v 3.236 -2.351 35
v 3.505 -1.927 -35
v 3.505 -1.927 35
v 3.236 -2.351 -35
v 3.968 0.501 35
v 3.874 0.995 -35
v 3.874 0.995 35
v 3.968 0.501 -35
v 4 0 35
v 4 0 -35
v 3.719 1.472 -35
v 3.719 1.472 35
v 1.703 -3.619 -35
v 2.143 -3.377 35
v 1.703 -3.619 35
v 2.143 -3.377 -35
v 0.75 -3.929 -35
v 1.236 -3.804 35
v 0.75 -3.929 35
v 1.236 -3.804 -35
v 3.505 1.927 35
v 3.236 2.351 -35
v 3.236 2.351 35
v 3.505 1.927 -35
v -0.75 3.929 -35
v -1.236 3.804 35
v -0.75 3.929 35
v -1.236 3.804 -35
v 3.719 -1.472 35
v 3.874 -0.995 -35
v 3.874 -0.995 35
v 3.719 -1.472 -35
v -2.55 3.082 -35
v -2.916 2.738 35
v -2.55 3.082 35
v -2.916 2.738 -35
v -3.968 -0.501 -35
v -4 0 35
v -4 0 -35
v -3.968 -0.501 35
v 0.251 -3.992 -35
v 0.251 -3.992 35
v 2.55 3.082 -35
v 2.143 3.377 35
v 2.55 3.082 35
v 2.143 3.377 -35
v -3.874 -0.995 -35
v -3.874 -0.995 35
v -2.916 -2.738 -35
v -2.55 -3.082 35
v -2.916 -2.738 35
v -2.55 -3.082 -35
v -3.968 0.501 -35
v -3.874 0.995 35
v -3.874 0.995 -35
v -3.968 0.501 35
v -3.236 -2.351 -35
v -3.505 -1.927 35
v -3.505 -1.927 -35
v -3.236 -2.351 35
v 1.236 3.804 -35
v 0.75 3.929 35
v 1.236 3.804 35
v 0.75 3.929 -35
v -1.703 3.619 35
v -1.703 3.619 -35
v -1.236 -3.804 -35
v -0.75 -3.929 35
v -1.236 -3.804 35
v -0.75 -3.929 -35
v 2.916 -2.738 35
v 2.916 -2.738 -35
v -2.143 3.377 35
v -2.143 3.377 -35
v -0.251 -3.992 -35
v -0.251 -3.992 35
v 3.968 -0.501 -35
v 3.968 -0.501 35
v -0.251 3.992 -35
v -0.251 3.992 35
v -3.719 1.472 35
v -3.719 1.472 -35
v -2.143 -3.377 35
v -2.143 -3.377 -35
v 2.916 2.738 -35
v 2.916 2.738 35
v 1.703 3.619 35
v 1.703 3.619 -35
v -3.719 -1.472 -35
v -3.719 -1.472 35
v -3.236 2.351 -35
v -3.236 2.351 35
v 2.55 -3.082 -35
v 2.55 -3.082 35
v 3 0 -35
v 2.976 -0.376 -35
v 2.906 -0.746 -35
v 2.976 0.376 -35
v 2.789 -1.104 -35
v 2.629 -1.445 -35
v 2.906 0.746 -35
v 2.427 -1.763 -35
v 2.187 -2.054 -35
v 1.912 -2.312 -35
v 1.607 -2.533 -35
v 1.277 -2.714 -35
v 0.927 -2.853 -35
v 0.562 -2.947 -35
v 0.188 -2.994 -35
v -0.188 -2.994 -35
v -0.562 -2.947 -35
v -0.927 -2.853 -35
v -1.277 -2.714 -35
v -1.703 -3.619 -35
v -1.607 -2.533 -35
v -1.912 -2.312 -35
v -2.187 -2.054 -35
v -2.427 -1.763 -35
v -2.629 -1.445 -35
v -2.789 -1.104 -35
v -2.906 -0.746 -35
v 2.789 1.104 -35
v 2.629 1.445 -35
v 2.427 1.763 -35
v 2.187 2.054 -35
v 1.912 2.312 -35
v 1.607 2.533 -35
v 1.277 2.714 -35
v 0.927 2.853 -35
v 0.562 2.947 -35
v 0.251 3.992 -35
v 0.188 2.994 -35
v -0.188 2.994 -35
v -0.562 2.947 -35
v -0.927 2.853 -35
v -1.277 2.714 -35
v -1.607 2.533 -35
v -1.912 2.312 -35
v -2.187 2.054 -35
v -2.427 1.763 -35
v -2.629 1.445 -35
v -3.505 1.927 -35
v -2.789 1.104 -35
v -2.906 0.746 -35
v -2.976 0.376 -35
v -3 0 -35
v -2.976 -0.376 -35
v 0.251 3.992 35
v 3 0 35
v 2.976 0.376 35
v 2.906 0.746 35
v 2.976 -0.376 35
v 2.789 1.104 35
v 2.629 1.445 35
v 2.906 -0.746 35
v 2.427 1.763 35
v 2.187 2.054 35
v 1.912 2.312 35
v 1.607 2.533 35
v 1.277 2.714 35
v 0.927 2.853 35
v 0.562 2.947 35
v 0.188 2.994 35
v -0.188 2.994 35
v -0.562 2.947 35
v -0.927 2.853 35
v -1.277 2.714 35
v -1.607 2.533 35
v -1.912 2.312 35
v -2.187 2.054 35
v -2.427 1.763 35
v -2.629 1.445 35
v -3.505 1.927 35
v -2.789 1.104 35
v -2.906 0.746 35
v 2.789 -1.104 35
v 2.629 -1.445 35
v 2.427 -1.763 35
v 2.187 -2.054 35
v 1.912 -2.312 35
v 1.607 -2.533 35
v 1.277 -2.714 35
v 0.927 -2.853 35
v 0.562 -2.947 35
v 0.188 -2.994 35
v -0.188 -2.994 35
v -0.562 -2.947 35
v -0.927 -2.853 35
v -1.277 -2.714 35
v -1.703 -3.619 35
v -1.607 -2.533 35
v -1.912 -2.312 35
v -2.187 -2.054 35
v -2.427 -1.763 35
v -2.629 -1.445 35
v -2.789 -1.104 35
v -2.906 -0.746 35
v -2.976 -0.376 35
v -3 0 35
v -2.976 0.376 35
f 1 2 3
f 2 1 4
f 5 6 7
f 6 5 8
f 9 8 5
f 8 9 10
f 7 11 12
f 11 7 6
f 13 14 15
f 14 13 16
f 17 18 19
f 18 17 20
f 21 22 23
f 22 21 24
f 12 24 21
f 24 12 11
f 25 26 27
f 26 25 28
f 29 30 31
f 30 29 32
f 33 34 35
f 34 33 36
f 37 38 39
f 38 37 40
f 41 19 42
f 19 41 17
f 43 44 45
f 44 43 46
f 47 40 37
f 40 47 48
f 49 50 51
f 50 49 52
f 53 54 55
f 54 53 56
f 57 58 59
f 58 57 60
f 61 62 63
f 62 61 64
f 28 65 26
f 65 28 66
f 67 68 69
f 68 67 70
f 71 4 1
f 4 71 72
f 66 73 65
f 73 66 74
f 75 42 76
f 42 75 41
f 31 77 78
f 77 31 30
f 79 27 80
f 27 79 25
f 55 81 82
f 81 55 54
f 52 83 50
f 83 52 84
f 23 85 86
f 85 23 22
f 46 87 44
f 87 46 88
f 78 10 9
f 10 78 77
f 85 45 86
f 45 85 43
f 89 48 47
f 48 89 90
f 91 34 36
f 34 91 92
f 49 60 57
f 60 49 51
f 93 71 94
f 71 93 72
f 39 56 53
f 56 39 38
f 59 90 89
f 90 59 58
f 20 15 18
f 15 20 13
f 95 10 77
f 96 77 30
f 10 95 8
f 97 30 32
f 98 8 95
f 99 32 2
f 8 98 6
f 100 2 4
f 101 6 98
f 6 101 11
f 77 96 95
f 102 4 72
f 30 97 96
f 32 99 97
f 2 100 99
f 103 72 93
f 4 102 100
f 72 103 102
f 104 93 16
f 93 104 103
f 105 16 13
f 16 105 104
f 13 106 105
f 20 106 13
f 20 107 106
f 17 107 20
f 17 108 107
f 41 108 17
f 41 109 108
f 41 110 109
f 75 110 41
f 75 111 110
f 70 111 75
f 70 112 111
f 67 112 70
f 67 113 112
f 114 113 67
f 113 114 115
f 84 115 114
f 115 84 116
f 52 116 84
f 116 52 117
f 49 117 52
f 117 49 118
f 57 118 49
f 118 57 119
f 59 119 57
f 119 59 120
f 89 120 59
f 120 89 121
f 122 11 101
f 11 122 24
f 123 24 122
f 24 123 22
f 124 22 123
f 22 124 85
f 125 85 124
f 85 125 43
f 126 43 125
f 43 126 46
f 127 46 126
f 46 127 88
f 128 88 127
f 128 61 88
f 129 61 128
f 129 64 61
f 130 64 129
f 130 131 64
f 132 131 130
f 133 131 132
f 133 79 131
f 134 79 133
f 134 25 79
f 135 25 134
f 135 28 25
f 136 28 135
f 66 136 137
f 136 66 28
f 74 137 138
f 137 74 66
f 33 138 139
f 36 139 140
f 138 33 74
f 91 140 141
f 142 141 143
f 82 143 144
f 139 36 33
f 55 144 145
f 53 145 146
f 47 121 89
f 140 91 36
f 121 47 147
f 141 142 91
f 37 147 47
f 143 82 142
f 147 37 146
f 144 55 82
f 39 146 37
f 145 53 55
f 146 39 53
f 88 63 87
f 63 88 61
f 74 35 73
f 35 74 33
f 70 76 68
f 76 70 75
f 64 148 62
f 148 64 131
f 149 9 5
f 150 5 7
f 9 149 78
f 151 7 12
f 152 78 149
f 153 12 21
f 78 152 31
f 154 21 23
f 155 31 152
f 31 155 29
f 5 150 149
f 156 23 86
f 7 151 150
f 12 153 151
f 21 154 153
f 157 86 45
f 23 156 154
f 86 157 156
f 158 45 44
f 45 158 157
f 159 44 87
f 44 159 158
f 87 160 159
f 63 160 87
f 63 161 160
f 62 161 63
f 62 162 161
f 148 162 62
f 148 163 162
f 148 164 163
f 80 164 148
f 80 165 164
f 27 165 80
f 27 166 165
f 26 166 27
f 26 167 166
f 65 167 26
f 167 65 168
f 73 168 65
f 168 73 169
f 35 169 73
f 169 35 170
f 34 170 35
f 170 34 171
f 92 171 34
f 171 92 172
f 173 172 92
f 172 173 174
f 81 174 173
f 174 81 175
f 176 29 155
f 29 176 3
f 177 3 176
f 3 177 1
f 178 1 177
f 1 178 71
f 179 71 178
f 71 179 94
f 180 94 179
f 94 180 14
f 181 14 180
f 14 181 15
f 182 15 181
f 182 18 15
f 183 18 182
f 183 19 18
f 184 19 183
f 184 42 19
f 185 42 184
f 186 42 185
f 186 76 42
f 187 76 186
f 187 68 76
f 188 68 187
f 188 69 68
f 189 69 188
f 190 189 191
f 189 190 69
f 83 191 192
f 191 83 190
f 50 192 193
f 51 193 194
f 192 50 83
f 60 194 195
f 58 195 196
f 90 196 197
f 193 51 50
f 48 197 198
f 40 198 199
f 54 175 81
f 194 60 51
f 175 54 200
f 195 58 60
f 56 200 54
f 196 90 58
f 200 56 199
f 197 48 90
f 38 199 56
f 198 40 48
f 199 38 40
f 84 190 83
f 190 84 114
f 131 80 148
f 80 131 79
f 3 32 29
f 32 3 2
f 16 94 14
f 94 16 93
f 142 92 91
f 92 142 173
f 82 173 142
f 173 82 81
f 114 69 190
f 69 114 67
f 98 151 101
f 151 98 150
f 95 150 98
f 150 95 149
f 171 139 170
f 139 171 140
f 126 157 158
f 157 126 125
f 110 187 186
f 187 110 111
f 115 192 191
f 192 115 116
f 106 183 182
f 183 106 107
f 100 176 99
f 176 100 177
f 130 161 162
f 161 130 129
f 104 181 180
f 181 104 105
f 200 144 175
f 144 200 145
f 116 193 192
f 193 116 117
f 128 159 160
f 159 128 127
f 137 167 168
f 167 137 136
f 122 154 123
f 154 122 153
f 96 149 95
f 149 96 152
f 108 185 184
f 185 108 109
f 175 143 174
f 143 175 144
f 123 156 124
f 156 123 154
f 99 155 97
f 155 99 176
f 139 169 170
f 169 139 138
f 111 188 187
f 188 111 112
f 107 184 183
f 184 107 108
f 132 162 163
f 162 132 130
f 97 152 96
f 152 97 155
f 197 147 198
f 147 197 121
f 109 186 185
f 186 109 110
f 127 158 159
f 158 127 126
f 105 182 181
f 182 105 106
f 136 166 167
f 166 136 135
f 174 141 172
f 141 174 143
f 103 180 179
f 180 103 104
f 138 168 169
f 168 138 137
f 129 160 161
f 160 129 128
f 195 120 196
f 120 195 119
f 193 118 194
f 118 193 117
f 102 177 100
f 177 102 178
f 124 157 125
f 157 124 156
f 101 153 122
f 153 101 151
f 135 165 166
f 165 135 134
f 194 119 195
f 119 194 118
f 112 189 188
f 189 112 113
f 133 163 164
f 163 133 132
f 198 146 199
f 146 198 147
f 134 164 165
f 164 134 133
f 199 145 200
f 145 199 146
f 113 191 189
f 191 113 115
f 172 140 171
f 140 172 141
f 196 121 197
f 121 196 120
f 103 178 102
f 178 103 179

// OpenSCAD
$fn = 50;


difference() {
	union() {
		translate(v = [0, 0, -35.0000000000]) {
			cylinder(h = 70, r = 4.0000000000);
		}
	}
	union() {
		translate(v = [0, 0, -100.0000000000]) {
			cylinder(h = 200, r = 3.0000000000);
		}
	}
}
